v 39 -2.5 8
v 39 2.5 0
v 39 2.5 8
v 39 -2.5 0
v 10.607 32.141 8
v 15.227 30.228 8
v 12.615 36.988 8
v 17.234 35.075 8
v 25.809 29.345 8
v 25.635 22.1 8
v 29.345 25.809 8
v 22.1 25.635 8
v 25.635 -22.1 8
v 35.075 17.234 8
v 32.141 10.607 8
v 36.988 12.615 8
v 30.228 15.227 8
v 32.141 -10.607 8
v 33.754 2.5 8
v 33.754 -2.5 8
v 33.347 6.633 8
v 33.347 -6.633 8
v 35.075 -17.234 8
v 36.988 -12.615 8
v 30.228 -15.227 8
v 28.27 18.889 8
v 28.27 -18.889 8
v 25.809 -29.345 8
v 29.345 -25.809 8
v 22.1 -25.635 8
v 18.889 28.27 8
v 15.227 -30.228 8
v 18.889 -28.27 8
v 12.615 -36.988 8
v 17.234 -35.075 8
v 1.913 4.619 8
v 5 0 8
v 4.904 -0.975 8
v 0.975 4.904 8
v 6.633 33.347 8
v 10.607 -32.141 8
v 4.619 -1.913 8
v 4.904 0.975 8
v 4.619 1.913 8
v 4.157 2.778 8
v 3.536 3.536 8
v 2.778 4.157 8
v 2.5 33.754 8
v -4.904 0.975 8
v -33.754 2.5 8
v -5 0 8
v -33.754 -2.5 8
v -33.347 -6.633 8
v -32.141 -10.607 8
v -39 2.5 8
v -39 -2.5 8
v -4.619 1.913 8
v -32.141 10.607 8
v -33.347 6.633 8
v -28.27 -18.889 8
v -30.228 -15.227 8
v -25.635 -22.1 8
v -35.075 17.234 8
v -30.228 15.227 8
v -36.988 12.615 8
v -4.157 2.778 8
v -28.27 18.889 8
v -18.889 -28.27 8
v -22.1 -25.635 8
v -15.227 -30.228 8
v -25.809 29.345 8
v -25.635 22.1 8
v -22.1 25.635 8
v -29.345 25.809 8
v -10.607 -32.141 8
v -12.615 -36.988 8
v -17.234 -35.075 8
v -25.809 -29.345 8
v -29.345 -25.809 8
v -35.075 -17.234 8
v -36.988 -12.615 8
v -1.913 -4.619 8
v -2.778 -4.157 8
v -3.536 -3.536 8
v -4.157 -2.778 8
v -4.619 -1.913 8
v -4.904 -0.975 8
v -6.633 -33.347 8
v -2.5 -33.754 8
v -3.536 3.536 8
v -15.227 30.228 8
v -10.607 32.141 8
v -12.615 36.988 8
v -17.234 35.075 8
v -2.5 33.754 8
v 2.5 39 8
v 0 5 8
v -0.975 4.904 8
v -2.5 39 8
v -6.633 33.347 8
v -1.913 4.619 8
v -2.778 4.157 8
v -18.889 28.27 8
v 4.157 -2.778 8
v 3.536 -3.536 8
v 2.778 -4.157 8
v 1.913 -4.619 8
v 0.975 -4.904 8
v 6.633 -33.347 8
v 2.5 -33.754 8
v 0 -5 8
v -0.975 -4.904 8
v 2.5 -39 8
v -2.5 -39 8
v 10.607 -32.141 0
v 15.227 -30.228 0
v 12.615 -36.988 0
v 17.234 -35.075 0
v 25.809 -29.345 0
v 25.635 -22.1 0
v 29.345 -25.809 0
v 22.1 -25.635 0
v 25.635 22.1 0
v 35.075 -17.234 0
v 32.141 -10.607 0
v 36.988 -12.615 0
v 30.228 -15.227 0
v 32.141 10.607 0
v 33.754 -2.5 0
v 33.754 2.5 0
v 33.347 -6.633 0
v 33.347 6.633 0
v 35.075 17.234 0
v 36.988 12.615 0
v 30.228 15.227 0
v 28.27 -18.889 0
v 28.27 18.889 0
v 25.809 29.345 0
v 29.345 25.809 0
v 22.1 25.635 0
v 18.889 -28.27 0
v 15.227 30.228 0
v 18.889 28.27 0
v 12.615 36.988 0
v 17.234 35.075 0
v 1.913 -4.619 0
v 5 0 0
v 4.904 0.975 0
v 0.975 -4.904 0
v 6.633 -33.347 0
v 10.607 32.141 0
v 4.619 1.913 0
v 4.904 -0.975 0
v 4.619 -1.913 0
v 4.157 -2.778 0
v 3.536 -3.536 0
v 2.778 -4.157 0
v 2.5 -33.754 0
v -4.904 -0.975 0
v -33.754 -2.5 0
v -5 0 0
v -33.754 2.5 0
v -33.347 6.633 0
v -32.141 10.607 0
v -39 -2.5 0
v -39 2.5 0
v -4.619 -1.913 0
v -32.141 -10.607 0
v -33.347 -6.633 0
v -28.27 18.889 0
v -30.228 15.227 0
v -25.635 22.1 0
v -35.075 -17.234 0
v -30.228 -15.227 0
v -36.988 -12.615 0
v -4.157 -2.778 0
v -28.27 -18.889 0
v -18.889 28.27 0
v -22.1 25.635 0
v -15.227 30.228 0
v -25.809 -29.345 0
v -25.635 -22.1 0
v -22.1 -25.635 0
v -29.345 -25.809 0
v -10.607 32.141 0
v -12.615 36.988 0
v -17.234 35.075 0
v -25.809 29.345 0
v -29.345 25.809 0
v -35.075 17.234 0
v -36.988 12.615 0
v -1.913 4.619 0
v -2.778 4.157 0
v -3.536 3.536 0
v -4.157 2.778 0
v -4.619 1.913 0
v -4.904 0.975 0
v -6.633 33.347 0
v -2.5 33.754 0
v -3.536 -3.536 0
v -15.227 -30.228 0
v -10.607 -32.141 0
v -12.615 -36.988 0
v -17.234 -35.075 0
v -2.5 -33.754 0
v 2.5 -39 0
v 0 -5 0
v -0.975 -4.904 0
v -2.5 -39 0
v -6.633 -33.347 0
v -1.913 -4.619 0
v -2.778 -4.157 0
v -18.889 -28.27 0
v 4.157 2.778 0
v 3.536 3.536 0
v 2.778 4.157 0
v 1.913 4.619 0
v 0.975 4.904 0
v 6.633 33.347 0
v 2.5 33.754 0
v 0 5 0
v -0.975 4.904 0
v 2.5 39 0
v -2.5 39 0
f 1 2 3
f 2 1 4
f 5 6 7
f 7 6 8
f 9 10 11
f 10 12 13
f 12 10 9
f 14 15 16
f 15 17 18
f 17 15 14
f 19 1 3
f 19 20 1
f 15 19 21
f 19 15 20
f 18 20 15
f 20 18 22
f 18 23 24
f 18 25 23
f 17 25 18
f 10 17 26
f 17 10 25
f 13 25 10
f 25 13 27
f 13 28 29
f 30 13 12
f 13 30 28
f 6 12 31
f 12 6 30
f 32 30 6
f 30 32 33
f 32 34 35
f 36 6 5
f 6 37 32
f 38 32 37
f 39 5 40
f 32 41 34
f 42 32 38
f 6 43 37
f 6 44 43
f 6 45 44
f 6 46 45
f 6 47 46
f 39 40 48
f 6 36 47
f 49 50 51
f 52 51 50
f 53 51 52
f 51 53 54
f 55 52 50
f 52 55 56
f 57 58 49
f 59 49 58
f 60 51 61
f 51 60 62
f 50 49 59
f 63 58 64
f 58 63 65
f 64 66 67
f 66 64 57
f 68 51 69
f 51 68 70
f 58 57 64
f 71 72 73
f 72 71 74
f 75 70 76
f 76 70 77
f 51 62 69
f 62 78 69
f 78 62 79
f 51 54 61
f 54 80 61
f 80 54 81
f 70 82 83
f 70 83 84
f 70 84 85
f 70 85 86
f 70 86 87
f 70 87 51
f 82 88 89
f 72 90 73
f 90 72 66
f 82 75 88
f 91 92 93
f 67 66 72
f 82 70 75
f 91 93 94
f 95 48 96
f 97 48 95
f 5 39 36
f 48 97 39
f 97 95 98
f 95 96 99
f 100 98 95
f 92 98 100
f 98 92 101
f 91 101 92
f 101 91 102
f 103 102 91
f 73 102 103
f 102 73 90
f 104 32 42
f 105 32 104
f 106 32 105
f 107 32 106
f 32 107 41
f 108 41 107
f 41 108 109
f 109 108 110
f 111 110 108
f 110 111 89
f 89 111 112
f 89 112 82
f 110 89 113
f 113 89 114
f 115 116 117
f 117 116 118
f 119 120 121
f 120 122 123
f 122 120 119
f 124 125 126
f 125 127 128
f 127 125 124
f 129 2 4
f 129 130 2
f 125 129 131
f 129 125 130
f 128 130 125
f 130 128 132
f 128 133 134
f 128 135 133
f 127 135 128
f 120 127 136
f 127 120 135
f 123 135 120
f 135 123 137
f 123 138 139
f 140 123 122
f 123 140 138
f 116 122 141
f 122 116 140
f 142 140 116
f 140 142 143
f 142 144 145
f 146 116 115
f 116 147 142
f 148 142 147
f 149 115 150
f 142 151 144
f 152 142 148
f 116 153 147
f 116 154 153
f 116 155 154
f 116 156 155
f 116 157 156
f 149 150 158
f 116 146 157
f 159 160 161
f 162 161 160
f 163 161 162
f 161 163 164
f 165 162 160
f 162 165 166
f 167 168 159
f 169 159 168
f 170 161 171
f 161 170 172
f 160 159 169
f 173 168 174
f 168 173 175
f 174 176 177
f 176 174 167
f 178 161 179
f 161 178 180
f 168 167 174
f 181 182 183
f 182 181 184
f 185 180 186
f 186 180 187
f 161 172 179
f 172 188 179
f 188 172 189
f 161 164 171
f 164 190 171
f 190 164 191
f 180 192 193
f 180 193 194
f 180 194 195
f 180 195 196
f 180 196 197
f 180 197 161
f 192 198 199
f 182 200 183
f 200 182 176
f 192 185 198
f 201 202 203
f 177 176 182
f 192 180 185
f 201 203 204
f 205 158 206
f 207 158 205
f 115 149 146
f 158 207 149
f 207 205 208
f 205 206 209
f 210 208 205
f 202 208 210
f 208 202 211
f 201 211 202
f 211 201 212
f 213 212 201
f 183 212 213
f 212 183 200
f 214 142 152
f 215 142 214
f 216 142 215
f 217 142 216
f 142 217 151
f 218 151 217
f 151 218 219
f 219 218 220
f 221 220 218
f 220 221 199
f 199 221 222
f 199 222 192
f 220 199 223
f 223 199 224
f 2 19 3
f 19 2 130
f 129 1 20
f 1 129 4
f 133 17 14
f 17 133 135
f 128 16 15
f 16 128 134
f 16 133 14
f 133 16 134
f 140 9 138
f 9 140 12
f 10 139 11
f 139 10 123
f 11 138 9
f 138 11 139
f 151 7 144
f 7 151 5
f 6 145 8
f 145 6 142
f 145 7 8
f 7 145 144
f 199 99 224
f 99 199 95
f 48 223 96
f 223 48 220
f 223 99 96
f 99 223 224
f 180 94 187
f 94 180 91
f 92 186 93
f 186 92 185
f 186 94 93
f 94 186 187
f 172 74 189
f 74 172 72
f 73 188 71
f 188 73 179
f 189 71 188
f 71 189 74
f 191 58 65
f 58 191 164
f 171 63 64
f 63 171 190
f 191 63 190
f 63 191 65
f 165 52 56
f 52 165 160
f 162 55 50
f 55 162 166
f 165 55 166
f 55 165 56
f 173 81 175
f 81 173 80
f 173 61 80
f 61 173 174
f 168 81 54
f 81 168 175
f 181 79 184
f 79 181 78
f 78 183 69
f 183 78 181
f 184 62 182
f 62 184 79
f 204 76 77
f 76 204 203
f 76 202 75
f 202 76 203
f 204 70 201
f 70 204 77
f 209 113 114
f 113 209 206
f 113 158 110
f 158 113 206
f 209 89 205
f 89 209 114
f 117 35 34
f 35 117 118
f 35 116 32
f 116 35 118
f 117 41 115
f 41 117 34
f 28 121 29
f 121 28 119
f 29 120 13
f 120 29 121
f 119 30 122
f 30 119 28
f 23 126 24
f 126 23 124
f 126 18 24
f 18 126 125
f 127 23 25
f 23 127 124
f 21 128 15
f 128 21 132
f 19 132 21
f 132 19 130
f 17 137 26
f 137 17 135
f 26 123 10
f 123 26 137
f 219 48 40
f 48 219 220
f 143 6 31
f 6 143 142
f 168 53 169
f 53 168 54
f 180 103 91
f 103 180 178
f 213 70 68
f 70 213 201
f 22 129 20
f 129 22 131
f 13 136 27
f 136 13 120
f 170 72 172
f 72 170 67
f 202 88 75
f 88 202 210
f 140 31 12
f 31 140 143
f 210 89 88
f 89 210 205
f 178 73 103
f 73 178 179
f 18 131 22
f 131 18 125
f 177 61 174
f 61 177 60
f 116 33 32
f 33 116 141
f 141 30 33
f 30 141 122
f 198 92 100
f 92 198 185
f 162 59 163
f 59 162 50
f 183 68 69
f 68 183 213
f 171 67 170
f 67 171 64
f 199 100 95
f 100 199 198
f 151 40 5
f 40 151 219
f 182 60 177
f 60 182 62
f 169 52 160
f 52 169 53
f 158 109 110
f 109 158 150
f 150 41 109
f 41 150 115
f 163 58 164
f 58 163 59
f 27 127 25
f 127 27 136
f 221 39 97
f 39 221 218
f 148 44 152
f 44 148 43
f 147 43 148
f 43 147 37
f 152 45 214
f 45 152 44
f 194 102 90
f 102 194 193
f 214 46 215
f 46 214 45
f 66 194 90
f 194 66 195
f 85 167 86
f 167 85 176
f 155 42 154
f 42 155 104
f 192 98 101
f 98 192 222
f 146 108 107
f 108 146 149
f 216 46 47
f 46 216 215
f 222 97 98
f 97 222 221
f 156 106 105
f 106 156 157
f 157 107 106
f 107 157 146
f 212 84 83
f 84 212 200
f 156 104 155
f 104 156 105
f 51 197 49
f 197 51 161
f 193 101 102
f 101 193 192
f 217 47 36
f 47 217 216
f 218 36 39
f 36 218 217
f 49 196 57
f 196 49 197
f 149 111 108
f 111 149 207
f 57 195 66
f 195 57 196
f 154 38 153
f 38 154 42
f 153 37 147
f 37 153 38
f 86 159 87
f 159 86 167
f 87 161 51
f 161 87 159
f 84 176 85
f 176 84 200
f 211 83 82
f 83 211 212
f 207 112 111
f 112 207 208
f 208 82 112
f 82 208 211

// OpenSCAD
$fn = 32;

// ----------------------------------------------------------------------
// Spur blank: bored gear blank
// ----------------------------------------------------------------------

// --- parameters (mm) ---
disc_r = 34;              // blank root radius
disc_t = 8;               // blank thickness
n_teeth = 16;             // stub tooth count
tooth_w = 5;              // tooth width at the root
tooth_h = 5;              // tooth height above the root
bore_r = 5;               // central bore radius

out_r = disc_r + tooth_h;  // tip radius
bbox_x = 78.0;  // measured width over the teeth
bbox_y = 78.0;  // measured depth over the teeth

difference() {
union() {
  cylinder(r = disc_r, h = disc_t);
  for (i = [0 : n_teeth - 1])
    rotate([0, 0, i * 360 / n_teeth])
      translate([disc_r - 1, -tooth_w / 2, 0])
        cube([tooth_h + 1, tooth_w, disc_t]);
}
  translate([0, 0, -1]) cylinder(r = bore_r, h = disc_t + 2);
}
